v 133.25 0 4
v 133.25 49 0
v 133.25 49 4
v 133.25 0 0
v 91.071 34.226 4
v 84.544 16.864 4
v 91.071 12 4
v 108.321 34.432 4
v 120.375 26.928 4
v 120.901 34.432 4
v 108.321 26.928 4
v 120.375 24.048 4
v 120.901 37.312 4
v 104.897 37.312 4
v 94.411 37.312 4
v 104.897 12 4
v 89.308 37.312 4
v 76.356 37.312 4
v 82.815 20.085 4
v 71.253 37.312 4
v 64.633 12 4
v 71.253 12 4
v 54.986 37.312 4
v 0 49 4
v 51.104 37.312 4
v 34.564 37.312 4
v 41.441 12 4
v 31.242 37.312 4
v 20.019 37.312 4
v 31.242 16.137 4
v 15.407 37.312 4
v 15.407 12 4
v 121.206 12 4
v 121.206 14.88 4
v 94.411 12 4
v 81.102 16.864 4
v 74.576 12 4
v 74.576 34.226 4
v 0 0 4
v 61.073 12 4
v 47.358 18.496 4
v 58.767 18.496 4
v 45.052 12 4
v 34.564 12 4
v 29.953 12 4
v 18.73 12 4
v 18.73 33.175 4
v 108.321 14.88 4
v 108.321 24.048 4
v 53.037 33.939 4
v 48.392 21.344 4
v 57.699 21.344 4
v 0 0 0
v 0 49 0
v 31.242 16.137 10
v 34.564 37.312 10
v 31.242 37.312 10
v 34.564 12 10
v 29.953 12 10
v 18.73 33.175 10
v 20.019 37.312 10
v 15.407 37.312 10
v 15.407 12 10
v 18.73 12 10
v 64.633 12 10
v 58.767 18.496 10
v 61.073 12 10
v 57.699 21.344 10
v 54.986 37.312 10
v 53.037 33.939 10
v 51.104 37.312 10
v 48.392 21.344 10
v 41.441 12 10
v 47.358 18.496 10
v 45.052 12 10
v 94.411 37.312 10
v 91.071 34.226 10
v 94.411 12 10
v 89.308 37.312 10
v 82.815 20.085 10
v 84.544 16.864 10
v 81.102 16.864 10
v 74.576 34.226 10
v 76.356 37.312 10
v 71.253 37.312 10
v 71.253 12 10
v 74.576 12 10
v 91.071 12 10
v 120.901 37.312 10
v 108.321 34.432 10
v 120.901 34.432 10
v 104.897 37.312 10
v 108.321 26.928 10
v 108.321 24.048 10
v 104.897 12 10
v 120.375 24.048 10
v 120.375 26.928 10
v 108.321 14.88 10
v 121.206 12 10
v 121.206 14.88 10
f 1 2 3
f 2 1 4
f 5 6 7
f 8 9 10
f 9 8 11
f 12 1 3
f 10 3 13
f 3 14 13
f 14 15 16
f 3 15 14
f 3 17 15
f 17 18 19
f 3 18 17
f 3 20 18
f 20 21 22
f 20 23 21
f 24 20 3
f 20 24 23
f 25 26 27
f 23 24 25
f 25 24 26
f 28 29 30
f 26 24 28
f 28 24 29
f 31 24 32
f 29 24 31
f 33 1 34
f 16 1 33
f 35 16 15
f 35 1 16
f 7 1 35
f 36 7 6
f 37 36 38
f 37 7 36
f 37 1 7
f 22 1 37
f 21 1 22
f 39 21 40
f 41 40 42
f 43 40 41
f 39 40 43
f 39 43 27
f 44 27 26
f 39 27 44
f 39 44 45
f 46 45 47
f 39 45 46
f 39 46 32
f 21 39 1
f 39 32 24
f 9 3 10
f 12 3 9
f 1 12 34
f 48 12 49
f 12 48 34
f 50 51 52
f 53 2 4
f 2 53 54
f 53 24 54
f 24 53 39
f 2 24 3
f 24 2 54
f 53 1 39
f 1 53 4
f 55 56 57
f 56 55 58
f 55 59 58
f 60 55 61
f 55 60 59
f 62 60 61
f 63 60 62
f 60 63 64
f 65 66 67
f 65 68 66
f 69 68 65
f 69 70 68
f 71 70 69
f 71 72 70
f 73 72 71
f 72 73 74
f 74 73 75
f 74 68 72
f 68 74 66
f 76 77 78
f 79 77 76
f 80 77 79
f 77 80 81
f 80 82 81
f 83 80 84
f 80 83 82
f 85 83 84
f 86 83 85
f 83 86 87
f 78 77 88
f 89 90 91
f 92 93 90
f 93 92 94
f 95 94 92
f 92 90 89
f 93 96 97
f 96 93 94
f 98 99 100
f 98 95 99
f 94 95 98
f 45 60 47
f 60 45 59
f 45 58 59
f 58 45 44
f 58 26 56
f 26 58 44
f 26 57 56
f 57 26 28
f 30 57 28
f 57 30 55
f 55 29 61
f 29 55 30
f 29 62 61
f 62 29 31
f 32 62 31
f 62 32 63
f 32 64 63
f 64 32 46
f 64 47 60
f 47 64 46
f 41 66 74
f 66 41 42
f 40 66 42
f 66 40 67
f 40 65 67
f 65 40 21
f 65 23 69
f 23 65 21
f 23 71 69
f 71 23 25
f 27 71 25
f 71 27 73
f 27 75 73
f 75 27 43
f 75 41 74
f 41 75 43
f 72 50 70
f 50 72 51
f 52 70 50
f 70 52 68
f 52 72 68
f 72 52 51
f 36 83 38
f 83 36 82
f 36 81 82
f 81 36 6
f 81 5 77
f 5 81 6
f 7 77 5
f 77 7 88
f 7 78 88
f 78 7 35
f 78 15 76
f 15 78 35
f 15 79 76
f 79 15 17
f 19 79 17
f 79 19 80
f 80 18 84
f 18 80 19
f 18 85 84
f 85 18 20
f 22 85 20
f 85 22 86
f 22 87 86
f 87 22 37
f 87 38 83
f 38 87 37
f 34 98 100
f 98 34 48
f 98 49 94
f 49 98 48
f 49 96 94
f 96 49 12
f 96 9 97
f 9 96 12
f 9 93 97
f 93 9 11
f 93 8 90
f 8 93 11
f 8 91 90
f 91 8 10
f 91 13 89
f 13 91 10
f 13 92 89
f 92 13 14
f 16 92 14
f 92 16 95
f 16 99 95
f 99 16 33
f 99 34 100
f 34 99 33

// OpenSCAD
// Dual Name Plank - the personalised model, generated per order.
//
// The measurements come from the product's own Fusion sketch (16.DNP/FONTS.png):
// text height 25 mm, a heavy grotesque face (Segoe UI Black on the designer's
// Windows machine; Arial Black is the metric-compatible stand-in available on
// macOS and Linux), hearts trailing the name. Every dimension is a parameter so
// the shop can tune the plank without touching this file - the backend passes
// them with -D.
//
// One caveat worth knowing: Fusion's "character spacing 8.00" is an absolute
// offset, while OpenSCAD's spacing is a multiplier on each glyph's own advance.
// They are not the same number. letter_spacing below is the multiplier that
// reads closest to the sample; it is a parameter precisely so it can be matched
// against a printed plank.

/* [Text] */
name_one = "NAME";          // the first name, always present
name_two = "";              // the second name; empty prints a single-name plank
font = "Arial Black";
letter_spacing = 1.15;      // OpenSCAD advance multiplier, not millimetres

/* [Sizes, mm] */
text_height_mm = 25;        // cap height, from the Fusion sketch
text_thickness_mm = 6;      // how far the letters stand proud of the base
line_gap_mm = 14;           // vertical gap between the two names
base_thickness_mm = 4;      // the plate the letters stand on
base_margin_mm = 12;        // plate margin around the text block
base_depth_mm = 50;         // front-to-back depth of the plate

/* [Preview] */
// The filament the customer chose, as a CSS colour. Only the rendered picture
// uses it - an STL carries no colour - so the preview shows the plank in the
// colour that will actually be loaded.
model_colour = "";

/* [Hearts] */
hearts = 0;                 // how many hearts trail the name
heart_stl = "";             // path to RED HEART.stl; empty draws none
heart_gap_mm = 6;

// A rough advance per character. OpenSCAD cannot measure rendered text, so the
// plate is sized from this estimate - deliberately generous, since a plate a
// few millimetres too wide still prints correctly while one too narrow clips
// the letters or seats a heart on top of them. 0.95 is measured against Arial
// Black, which is wider than most faces; a lighter font simply leaves more
// margin.
function text_width(s) = len(s) * text_height_mm * 0.95 * letter_spacing;

lines = name_two == "" ? 1 : 2;
text_block_w = max(text_width(name_one), text_width(name_two));
heart_size_mm = text_height_mm * 0.72;
heart_w = hearts > 0 ? hearts * (heart_size_mm + heart_gap_mm) + heart_gap_mm : 0;
plate_w = text_block_w + heart_w + 2 * base_margin_mm;
plate_h = lines * text_height_mm + (lines - 1) * line_gap_mm + 2 * base_margin_mm;

module name_line(s, y) {
    translate([base_margin_mm, y, base_thickness_mm])
        linear_extrude(height = text_thickness_mm)
            text(s, size = text_height_mm, font = font, spacing = letter_spacing,
                 halign = "left", valign = "baseline", $fn = 32);
}

module plate() {
    cube([plate_w, plate_h, base_thickness_mm]);
}

module heart_row() {
    if (hearts > 0 && heart_stl != "") {
        for (i = [0 : hearts - 1]) {
            translate([base_margin_mm + text_block_w + heart_gap_mm + i * (heart_size_mm + heart_gap_mm),
                       base_margin_mm,
                       base_thickness_mm])
                // The heart is authored 18 x 18 x 38 mm; scale it to the text.
                scale(text_height_mm / 38) import(heart_stl, convexity = 5);
        }
    }
}

module plank() {
    union() {
        plate();
        name_line(name_one, base_margin_mm);
        if (lines == 2) name_line(name_two, base_margin_mm + text_height_mm + line_gap_mm);
        heart_row();
    }
}

if (model_colour == "") plank();
else color(model_colour) plank();
